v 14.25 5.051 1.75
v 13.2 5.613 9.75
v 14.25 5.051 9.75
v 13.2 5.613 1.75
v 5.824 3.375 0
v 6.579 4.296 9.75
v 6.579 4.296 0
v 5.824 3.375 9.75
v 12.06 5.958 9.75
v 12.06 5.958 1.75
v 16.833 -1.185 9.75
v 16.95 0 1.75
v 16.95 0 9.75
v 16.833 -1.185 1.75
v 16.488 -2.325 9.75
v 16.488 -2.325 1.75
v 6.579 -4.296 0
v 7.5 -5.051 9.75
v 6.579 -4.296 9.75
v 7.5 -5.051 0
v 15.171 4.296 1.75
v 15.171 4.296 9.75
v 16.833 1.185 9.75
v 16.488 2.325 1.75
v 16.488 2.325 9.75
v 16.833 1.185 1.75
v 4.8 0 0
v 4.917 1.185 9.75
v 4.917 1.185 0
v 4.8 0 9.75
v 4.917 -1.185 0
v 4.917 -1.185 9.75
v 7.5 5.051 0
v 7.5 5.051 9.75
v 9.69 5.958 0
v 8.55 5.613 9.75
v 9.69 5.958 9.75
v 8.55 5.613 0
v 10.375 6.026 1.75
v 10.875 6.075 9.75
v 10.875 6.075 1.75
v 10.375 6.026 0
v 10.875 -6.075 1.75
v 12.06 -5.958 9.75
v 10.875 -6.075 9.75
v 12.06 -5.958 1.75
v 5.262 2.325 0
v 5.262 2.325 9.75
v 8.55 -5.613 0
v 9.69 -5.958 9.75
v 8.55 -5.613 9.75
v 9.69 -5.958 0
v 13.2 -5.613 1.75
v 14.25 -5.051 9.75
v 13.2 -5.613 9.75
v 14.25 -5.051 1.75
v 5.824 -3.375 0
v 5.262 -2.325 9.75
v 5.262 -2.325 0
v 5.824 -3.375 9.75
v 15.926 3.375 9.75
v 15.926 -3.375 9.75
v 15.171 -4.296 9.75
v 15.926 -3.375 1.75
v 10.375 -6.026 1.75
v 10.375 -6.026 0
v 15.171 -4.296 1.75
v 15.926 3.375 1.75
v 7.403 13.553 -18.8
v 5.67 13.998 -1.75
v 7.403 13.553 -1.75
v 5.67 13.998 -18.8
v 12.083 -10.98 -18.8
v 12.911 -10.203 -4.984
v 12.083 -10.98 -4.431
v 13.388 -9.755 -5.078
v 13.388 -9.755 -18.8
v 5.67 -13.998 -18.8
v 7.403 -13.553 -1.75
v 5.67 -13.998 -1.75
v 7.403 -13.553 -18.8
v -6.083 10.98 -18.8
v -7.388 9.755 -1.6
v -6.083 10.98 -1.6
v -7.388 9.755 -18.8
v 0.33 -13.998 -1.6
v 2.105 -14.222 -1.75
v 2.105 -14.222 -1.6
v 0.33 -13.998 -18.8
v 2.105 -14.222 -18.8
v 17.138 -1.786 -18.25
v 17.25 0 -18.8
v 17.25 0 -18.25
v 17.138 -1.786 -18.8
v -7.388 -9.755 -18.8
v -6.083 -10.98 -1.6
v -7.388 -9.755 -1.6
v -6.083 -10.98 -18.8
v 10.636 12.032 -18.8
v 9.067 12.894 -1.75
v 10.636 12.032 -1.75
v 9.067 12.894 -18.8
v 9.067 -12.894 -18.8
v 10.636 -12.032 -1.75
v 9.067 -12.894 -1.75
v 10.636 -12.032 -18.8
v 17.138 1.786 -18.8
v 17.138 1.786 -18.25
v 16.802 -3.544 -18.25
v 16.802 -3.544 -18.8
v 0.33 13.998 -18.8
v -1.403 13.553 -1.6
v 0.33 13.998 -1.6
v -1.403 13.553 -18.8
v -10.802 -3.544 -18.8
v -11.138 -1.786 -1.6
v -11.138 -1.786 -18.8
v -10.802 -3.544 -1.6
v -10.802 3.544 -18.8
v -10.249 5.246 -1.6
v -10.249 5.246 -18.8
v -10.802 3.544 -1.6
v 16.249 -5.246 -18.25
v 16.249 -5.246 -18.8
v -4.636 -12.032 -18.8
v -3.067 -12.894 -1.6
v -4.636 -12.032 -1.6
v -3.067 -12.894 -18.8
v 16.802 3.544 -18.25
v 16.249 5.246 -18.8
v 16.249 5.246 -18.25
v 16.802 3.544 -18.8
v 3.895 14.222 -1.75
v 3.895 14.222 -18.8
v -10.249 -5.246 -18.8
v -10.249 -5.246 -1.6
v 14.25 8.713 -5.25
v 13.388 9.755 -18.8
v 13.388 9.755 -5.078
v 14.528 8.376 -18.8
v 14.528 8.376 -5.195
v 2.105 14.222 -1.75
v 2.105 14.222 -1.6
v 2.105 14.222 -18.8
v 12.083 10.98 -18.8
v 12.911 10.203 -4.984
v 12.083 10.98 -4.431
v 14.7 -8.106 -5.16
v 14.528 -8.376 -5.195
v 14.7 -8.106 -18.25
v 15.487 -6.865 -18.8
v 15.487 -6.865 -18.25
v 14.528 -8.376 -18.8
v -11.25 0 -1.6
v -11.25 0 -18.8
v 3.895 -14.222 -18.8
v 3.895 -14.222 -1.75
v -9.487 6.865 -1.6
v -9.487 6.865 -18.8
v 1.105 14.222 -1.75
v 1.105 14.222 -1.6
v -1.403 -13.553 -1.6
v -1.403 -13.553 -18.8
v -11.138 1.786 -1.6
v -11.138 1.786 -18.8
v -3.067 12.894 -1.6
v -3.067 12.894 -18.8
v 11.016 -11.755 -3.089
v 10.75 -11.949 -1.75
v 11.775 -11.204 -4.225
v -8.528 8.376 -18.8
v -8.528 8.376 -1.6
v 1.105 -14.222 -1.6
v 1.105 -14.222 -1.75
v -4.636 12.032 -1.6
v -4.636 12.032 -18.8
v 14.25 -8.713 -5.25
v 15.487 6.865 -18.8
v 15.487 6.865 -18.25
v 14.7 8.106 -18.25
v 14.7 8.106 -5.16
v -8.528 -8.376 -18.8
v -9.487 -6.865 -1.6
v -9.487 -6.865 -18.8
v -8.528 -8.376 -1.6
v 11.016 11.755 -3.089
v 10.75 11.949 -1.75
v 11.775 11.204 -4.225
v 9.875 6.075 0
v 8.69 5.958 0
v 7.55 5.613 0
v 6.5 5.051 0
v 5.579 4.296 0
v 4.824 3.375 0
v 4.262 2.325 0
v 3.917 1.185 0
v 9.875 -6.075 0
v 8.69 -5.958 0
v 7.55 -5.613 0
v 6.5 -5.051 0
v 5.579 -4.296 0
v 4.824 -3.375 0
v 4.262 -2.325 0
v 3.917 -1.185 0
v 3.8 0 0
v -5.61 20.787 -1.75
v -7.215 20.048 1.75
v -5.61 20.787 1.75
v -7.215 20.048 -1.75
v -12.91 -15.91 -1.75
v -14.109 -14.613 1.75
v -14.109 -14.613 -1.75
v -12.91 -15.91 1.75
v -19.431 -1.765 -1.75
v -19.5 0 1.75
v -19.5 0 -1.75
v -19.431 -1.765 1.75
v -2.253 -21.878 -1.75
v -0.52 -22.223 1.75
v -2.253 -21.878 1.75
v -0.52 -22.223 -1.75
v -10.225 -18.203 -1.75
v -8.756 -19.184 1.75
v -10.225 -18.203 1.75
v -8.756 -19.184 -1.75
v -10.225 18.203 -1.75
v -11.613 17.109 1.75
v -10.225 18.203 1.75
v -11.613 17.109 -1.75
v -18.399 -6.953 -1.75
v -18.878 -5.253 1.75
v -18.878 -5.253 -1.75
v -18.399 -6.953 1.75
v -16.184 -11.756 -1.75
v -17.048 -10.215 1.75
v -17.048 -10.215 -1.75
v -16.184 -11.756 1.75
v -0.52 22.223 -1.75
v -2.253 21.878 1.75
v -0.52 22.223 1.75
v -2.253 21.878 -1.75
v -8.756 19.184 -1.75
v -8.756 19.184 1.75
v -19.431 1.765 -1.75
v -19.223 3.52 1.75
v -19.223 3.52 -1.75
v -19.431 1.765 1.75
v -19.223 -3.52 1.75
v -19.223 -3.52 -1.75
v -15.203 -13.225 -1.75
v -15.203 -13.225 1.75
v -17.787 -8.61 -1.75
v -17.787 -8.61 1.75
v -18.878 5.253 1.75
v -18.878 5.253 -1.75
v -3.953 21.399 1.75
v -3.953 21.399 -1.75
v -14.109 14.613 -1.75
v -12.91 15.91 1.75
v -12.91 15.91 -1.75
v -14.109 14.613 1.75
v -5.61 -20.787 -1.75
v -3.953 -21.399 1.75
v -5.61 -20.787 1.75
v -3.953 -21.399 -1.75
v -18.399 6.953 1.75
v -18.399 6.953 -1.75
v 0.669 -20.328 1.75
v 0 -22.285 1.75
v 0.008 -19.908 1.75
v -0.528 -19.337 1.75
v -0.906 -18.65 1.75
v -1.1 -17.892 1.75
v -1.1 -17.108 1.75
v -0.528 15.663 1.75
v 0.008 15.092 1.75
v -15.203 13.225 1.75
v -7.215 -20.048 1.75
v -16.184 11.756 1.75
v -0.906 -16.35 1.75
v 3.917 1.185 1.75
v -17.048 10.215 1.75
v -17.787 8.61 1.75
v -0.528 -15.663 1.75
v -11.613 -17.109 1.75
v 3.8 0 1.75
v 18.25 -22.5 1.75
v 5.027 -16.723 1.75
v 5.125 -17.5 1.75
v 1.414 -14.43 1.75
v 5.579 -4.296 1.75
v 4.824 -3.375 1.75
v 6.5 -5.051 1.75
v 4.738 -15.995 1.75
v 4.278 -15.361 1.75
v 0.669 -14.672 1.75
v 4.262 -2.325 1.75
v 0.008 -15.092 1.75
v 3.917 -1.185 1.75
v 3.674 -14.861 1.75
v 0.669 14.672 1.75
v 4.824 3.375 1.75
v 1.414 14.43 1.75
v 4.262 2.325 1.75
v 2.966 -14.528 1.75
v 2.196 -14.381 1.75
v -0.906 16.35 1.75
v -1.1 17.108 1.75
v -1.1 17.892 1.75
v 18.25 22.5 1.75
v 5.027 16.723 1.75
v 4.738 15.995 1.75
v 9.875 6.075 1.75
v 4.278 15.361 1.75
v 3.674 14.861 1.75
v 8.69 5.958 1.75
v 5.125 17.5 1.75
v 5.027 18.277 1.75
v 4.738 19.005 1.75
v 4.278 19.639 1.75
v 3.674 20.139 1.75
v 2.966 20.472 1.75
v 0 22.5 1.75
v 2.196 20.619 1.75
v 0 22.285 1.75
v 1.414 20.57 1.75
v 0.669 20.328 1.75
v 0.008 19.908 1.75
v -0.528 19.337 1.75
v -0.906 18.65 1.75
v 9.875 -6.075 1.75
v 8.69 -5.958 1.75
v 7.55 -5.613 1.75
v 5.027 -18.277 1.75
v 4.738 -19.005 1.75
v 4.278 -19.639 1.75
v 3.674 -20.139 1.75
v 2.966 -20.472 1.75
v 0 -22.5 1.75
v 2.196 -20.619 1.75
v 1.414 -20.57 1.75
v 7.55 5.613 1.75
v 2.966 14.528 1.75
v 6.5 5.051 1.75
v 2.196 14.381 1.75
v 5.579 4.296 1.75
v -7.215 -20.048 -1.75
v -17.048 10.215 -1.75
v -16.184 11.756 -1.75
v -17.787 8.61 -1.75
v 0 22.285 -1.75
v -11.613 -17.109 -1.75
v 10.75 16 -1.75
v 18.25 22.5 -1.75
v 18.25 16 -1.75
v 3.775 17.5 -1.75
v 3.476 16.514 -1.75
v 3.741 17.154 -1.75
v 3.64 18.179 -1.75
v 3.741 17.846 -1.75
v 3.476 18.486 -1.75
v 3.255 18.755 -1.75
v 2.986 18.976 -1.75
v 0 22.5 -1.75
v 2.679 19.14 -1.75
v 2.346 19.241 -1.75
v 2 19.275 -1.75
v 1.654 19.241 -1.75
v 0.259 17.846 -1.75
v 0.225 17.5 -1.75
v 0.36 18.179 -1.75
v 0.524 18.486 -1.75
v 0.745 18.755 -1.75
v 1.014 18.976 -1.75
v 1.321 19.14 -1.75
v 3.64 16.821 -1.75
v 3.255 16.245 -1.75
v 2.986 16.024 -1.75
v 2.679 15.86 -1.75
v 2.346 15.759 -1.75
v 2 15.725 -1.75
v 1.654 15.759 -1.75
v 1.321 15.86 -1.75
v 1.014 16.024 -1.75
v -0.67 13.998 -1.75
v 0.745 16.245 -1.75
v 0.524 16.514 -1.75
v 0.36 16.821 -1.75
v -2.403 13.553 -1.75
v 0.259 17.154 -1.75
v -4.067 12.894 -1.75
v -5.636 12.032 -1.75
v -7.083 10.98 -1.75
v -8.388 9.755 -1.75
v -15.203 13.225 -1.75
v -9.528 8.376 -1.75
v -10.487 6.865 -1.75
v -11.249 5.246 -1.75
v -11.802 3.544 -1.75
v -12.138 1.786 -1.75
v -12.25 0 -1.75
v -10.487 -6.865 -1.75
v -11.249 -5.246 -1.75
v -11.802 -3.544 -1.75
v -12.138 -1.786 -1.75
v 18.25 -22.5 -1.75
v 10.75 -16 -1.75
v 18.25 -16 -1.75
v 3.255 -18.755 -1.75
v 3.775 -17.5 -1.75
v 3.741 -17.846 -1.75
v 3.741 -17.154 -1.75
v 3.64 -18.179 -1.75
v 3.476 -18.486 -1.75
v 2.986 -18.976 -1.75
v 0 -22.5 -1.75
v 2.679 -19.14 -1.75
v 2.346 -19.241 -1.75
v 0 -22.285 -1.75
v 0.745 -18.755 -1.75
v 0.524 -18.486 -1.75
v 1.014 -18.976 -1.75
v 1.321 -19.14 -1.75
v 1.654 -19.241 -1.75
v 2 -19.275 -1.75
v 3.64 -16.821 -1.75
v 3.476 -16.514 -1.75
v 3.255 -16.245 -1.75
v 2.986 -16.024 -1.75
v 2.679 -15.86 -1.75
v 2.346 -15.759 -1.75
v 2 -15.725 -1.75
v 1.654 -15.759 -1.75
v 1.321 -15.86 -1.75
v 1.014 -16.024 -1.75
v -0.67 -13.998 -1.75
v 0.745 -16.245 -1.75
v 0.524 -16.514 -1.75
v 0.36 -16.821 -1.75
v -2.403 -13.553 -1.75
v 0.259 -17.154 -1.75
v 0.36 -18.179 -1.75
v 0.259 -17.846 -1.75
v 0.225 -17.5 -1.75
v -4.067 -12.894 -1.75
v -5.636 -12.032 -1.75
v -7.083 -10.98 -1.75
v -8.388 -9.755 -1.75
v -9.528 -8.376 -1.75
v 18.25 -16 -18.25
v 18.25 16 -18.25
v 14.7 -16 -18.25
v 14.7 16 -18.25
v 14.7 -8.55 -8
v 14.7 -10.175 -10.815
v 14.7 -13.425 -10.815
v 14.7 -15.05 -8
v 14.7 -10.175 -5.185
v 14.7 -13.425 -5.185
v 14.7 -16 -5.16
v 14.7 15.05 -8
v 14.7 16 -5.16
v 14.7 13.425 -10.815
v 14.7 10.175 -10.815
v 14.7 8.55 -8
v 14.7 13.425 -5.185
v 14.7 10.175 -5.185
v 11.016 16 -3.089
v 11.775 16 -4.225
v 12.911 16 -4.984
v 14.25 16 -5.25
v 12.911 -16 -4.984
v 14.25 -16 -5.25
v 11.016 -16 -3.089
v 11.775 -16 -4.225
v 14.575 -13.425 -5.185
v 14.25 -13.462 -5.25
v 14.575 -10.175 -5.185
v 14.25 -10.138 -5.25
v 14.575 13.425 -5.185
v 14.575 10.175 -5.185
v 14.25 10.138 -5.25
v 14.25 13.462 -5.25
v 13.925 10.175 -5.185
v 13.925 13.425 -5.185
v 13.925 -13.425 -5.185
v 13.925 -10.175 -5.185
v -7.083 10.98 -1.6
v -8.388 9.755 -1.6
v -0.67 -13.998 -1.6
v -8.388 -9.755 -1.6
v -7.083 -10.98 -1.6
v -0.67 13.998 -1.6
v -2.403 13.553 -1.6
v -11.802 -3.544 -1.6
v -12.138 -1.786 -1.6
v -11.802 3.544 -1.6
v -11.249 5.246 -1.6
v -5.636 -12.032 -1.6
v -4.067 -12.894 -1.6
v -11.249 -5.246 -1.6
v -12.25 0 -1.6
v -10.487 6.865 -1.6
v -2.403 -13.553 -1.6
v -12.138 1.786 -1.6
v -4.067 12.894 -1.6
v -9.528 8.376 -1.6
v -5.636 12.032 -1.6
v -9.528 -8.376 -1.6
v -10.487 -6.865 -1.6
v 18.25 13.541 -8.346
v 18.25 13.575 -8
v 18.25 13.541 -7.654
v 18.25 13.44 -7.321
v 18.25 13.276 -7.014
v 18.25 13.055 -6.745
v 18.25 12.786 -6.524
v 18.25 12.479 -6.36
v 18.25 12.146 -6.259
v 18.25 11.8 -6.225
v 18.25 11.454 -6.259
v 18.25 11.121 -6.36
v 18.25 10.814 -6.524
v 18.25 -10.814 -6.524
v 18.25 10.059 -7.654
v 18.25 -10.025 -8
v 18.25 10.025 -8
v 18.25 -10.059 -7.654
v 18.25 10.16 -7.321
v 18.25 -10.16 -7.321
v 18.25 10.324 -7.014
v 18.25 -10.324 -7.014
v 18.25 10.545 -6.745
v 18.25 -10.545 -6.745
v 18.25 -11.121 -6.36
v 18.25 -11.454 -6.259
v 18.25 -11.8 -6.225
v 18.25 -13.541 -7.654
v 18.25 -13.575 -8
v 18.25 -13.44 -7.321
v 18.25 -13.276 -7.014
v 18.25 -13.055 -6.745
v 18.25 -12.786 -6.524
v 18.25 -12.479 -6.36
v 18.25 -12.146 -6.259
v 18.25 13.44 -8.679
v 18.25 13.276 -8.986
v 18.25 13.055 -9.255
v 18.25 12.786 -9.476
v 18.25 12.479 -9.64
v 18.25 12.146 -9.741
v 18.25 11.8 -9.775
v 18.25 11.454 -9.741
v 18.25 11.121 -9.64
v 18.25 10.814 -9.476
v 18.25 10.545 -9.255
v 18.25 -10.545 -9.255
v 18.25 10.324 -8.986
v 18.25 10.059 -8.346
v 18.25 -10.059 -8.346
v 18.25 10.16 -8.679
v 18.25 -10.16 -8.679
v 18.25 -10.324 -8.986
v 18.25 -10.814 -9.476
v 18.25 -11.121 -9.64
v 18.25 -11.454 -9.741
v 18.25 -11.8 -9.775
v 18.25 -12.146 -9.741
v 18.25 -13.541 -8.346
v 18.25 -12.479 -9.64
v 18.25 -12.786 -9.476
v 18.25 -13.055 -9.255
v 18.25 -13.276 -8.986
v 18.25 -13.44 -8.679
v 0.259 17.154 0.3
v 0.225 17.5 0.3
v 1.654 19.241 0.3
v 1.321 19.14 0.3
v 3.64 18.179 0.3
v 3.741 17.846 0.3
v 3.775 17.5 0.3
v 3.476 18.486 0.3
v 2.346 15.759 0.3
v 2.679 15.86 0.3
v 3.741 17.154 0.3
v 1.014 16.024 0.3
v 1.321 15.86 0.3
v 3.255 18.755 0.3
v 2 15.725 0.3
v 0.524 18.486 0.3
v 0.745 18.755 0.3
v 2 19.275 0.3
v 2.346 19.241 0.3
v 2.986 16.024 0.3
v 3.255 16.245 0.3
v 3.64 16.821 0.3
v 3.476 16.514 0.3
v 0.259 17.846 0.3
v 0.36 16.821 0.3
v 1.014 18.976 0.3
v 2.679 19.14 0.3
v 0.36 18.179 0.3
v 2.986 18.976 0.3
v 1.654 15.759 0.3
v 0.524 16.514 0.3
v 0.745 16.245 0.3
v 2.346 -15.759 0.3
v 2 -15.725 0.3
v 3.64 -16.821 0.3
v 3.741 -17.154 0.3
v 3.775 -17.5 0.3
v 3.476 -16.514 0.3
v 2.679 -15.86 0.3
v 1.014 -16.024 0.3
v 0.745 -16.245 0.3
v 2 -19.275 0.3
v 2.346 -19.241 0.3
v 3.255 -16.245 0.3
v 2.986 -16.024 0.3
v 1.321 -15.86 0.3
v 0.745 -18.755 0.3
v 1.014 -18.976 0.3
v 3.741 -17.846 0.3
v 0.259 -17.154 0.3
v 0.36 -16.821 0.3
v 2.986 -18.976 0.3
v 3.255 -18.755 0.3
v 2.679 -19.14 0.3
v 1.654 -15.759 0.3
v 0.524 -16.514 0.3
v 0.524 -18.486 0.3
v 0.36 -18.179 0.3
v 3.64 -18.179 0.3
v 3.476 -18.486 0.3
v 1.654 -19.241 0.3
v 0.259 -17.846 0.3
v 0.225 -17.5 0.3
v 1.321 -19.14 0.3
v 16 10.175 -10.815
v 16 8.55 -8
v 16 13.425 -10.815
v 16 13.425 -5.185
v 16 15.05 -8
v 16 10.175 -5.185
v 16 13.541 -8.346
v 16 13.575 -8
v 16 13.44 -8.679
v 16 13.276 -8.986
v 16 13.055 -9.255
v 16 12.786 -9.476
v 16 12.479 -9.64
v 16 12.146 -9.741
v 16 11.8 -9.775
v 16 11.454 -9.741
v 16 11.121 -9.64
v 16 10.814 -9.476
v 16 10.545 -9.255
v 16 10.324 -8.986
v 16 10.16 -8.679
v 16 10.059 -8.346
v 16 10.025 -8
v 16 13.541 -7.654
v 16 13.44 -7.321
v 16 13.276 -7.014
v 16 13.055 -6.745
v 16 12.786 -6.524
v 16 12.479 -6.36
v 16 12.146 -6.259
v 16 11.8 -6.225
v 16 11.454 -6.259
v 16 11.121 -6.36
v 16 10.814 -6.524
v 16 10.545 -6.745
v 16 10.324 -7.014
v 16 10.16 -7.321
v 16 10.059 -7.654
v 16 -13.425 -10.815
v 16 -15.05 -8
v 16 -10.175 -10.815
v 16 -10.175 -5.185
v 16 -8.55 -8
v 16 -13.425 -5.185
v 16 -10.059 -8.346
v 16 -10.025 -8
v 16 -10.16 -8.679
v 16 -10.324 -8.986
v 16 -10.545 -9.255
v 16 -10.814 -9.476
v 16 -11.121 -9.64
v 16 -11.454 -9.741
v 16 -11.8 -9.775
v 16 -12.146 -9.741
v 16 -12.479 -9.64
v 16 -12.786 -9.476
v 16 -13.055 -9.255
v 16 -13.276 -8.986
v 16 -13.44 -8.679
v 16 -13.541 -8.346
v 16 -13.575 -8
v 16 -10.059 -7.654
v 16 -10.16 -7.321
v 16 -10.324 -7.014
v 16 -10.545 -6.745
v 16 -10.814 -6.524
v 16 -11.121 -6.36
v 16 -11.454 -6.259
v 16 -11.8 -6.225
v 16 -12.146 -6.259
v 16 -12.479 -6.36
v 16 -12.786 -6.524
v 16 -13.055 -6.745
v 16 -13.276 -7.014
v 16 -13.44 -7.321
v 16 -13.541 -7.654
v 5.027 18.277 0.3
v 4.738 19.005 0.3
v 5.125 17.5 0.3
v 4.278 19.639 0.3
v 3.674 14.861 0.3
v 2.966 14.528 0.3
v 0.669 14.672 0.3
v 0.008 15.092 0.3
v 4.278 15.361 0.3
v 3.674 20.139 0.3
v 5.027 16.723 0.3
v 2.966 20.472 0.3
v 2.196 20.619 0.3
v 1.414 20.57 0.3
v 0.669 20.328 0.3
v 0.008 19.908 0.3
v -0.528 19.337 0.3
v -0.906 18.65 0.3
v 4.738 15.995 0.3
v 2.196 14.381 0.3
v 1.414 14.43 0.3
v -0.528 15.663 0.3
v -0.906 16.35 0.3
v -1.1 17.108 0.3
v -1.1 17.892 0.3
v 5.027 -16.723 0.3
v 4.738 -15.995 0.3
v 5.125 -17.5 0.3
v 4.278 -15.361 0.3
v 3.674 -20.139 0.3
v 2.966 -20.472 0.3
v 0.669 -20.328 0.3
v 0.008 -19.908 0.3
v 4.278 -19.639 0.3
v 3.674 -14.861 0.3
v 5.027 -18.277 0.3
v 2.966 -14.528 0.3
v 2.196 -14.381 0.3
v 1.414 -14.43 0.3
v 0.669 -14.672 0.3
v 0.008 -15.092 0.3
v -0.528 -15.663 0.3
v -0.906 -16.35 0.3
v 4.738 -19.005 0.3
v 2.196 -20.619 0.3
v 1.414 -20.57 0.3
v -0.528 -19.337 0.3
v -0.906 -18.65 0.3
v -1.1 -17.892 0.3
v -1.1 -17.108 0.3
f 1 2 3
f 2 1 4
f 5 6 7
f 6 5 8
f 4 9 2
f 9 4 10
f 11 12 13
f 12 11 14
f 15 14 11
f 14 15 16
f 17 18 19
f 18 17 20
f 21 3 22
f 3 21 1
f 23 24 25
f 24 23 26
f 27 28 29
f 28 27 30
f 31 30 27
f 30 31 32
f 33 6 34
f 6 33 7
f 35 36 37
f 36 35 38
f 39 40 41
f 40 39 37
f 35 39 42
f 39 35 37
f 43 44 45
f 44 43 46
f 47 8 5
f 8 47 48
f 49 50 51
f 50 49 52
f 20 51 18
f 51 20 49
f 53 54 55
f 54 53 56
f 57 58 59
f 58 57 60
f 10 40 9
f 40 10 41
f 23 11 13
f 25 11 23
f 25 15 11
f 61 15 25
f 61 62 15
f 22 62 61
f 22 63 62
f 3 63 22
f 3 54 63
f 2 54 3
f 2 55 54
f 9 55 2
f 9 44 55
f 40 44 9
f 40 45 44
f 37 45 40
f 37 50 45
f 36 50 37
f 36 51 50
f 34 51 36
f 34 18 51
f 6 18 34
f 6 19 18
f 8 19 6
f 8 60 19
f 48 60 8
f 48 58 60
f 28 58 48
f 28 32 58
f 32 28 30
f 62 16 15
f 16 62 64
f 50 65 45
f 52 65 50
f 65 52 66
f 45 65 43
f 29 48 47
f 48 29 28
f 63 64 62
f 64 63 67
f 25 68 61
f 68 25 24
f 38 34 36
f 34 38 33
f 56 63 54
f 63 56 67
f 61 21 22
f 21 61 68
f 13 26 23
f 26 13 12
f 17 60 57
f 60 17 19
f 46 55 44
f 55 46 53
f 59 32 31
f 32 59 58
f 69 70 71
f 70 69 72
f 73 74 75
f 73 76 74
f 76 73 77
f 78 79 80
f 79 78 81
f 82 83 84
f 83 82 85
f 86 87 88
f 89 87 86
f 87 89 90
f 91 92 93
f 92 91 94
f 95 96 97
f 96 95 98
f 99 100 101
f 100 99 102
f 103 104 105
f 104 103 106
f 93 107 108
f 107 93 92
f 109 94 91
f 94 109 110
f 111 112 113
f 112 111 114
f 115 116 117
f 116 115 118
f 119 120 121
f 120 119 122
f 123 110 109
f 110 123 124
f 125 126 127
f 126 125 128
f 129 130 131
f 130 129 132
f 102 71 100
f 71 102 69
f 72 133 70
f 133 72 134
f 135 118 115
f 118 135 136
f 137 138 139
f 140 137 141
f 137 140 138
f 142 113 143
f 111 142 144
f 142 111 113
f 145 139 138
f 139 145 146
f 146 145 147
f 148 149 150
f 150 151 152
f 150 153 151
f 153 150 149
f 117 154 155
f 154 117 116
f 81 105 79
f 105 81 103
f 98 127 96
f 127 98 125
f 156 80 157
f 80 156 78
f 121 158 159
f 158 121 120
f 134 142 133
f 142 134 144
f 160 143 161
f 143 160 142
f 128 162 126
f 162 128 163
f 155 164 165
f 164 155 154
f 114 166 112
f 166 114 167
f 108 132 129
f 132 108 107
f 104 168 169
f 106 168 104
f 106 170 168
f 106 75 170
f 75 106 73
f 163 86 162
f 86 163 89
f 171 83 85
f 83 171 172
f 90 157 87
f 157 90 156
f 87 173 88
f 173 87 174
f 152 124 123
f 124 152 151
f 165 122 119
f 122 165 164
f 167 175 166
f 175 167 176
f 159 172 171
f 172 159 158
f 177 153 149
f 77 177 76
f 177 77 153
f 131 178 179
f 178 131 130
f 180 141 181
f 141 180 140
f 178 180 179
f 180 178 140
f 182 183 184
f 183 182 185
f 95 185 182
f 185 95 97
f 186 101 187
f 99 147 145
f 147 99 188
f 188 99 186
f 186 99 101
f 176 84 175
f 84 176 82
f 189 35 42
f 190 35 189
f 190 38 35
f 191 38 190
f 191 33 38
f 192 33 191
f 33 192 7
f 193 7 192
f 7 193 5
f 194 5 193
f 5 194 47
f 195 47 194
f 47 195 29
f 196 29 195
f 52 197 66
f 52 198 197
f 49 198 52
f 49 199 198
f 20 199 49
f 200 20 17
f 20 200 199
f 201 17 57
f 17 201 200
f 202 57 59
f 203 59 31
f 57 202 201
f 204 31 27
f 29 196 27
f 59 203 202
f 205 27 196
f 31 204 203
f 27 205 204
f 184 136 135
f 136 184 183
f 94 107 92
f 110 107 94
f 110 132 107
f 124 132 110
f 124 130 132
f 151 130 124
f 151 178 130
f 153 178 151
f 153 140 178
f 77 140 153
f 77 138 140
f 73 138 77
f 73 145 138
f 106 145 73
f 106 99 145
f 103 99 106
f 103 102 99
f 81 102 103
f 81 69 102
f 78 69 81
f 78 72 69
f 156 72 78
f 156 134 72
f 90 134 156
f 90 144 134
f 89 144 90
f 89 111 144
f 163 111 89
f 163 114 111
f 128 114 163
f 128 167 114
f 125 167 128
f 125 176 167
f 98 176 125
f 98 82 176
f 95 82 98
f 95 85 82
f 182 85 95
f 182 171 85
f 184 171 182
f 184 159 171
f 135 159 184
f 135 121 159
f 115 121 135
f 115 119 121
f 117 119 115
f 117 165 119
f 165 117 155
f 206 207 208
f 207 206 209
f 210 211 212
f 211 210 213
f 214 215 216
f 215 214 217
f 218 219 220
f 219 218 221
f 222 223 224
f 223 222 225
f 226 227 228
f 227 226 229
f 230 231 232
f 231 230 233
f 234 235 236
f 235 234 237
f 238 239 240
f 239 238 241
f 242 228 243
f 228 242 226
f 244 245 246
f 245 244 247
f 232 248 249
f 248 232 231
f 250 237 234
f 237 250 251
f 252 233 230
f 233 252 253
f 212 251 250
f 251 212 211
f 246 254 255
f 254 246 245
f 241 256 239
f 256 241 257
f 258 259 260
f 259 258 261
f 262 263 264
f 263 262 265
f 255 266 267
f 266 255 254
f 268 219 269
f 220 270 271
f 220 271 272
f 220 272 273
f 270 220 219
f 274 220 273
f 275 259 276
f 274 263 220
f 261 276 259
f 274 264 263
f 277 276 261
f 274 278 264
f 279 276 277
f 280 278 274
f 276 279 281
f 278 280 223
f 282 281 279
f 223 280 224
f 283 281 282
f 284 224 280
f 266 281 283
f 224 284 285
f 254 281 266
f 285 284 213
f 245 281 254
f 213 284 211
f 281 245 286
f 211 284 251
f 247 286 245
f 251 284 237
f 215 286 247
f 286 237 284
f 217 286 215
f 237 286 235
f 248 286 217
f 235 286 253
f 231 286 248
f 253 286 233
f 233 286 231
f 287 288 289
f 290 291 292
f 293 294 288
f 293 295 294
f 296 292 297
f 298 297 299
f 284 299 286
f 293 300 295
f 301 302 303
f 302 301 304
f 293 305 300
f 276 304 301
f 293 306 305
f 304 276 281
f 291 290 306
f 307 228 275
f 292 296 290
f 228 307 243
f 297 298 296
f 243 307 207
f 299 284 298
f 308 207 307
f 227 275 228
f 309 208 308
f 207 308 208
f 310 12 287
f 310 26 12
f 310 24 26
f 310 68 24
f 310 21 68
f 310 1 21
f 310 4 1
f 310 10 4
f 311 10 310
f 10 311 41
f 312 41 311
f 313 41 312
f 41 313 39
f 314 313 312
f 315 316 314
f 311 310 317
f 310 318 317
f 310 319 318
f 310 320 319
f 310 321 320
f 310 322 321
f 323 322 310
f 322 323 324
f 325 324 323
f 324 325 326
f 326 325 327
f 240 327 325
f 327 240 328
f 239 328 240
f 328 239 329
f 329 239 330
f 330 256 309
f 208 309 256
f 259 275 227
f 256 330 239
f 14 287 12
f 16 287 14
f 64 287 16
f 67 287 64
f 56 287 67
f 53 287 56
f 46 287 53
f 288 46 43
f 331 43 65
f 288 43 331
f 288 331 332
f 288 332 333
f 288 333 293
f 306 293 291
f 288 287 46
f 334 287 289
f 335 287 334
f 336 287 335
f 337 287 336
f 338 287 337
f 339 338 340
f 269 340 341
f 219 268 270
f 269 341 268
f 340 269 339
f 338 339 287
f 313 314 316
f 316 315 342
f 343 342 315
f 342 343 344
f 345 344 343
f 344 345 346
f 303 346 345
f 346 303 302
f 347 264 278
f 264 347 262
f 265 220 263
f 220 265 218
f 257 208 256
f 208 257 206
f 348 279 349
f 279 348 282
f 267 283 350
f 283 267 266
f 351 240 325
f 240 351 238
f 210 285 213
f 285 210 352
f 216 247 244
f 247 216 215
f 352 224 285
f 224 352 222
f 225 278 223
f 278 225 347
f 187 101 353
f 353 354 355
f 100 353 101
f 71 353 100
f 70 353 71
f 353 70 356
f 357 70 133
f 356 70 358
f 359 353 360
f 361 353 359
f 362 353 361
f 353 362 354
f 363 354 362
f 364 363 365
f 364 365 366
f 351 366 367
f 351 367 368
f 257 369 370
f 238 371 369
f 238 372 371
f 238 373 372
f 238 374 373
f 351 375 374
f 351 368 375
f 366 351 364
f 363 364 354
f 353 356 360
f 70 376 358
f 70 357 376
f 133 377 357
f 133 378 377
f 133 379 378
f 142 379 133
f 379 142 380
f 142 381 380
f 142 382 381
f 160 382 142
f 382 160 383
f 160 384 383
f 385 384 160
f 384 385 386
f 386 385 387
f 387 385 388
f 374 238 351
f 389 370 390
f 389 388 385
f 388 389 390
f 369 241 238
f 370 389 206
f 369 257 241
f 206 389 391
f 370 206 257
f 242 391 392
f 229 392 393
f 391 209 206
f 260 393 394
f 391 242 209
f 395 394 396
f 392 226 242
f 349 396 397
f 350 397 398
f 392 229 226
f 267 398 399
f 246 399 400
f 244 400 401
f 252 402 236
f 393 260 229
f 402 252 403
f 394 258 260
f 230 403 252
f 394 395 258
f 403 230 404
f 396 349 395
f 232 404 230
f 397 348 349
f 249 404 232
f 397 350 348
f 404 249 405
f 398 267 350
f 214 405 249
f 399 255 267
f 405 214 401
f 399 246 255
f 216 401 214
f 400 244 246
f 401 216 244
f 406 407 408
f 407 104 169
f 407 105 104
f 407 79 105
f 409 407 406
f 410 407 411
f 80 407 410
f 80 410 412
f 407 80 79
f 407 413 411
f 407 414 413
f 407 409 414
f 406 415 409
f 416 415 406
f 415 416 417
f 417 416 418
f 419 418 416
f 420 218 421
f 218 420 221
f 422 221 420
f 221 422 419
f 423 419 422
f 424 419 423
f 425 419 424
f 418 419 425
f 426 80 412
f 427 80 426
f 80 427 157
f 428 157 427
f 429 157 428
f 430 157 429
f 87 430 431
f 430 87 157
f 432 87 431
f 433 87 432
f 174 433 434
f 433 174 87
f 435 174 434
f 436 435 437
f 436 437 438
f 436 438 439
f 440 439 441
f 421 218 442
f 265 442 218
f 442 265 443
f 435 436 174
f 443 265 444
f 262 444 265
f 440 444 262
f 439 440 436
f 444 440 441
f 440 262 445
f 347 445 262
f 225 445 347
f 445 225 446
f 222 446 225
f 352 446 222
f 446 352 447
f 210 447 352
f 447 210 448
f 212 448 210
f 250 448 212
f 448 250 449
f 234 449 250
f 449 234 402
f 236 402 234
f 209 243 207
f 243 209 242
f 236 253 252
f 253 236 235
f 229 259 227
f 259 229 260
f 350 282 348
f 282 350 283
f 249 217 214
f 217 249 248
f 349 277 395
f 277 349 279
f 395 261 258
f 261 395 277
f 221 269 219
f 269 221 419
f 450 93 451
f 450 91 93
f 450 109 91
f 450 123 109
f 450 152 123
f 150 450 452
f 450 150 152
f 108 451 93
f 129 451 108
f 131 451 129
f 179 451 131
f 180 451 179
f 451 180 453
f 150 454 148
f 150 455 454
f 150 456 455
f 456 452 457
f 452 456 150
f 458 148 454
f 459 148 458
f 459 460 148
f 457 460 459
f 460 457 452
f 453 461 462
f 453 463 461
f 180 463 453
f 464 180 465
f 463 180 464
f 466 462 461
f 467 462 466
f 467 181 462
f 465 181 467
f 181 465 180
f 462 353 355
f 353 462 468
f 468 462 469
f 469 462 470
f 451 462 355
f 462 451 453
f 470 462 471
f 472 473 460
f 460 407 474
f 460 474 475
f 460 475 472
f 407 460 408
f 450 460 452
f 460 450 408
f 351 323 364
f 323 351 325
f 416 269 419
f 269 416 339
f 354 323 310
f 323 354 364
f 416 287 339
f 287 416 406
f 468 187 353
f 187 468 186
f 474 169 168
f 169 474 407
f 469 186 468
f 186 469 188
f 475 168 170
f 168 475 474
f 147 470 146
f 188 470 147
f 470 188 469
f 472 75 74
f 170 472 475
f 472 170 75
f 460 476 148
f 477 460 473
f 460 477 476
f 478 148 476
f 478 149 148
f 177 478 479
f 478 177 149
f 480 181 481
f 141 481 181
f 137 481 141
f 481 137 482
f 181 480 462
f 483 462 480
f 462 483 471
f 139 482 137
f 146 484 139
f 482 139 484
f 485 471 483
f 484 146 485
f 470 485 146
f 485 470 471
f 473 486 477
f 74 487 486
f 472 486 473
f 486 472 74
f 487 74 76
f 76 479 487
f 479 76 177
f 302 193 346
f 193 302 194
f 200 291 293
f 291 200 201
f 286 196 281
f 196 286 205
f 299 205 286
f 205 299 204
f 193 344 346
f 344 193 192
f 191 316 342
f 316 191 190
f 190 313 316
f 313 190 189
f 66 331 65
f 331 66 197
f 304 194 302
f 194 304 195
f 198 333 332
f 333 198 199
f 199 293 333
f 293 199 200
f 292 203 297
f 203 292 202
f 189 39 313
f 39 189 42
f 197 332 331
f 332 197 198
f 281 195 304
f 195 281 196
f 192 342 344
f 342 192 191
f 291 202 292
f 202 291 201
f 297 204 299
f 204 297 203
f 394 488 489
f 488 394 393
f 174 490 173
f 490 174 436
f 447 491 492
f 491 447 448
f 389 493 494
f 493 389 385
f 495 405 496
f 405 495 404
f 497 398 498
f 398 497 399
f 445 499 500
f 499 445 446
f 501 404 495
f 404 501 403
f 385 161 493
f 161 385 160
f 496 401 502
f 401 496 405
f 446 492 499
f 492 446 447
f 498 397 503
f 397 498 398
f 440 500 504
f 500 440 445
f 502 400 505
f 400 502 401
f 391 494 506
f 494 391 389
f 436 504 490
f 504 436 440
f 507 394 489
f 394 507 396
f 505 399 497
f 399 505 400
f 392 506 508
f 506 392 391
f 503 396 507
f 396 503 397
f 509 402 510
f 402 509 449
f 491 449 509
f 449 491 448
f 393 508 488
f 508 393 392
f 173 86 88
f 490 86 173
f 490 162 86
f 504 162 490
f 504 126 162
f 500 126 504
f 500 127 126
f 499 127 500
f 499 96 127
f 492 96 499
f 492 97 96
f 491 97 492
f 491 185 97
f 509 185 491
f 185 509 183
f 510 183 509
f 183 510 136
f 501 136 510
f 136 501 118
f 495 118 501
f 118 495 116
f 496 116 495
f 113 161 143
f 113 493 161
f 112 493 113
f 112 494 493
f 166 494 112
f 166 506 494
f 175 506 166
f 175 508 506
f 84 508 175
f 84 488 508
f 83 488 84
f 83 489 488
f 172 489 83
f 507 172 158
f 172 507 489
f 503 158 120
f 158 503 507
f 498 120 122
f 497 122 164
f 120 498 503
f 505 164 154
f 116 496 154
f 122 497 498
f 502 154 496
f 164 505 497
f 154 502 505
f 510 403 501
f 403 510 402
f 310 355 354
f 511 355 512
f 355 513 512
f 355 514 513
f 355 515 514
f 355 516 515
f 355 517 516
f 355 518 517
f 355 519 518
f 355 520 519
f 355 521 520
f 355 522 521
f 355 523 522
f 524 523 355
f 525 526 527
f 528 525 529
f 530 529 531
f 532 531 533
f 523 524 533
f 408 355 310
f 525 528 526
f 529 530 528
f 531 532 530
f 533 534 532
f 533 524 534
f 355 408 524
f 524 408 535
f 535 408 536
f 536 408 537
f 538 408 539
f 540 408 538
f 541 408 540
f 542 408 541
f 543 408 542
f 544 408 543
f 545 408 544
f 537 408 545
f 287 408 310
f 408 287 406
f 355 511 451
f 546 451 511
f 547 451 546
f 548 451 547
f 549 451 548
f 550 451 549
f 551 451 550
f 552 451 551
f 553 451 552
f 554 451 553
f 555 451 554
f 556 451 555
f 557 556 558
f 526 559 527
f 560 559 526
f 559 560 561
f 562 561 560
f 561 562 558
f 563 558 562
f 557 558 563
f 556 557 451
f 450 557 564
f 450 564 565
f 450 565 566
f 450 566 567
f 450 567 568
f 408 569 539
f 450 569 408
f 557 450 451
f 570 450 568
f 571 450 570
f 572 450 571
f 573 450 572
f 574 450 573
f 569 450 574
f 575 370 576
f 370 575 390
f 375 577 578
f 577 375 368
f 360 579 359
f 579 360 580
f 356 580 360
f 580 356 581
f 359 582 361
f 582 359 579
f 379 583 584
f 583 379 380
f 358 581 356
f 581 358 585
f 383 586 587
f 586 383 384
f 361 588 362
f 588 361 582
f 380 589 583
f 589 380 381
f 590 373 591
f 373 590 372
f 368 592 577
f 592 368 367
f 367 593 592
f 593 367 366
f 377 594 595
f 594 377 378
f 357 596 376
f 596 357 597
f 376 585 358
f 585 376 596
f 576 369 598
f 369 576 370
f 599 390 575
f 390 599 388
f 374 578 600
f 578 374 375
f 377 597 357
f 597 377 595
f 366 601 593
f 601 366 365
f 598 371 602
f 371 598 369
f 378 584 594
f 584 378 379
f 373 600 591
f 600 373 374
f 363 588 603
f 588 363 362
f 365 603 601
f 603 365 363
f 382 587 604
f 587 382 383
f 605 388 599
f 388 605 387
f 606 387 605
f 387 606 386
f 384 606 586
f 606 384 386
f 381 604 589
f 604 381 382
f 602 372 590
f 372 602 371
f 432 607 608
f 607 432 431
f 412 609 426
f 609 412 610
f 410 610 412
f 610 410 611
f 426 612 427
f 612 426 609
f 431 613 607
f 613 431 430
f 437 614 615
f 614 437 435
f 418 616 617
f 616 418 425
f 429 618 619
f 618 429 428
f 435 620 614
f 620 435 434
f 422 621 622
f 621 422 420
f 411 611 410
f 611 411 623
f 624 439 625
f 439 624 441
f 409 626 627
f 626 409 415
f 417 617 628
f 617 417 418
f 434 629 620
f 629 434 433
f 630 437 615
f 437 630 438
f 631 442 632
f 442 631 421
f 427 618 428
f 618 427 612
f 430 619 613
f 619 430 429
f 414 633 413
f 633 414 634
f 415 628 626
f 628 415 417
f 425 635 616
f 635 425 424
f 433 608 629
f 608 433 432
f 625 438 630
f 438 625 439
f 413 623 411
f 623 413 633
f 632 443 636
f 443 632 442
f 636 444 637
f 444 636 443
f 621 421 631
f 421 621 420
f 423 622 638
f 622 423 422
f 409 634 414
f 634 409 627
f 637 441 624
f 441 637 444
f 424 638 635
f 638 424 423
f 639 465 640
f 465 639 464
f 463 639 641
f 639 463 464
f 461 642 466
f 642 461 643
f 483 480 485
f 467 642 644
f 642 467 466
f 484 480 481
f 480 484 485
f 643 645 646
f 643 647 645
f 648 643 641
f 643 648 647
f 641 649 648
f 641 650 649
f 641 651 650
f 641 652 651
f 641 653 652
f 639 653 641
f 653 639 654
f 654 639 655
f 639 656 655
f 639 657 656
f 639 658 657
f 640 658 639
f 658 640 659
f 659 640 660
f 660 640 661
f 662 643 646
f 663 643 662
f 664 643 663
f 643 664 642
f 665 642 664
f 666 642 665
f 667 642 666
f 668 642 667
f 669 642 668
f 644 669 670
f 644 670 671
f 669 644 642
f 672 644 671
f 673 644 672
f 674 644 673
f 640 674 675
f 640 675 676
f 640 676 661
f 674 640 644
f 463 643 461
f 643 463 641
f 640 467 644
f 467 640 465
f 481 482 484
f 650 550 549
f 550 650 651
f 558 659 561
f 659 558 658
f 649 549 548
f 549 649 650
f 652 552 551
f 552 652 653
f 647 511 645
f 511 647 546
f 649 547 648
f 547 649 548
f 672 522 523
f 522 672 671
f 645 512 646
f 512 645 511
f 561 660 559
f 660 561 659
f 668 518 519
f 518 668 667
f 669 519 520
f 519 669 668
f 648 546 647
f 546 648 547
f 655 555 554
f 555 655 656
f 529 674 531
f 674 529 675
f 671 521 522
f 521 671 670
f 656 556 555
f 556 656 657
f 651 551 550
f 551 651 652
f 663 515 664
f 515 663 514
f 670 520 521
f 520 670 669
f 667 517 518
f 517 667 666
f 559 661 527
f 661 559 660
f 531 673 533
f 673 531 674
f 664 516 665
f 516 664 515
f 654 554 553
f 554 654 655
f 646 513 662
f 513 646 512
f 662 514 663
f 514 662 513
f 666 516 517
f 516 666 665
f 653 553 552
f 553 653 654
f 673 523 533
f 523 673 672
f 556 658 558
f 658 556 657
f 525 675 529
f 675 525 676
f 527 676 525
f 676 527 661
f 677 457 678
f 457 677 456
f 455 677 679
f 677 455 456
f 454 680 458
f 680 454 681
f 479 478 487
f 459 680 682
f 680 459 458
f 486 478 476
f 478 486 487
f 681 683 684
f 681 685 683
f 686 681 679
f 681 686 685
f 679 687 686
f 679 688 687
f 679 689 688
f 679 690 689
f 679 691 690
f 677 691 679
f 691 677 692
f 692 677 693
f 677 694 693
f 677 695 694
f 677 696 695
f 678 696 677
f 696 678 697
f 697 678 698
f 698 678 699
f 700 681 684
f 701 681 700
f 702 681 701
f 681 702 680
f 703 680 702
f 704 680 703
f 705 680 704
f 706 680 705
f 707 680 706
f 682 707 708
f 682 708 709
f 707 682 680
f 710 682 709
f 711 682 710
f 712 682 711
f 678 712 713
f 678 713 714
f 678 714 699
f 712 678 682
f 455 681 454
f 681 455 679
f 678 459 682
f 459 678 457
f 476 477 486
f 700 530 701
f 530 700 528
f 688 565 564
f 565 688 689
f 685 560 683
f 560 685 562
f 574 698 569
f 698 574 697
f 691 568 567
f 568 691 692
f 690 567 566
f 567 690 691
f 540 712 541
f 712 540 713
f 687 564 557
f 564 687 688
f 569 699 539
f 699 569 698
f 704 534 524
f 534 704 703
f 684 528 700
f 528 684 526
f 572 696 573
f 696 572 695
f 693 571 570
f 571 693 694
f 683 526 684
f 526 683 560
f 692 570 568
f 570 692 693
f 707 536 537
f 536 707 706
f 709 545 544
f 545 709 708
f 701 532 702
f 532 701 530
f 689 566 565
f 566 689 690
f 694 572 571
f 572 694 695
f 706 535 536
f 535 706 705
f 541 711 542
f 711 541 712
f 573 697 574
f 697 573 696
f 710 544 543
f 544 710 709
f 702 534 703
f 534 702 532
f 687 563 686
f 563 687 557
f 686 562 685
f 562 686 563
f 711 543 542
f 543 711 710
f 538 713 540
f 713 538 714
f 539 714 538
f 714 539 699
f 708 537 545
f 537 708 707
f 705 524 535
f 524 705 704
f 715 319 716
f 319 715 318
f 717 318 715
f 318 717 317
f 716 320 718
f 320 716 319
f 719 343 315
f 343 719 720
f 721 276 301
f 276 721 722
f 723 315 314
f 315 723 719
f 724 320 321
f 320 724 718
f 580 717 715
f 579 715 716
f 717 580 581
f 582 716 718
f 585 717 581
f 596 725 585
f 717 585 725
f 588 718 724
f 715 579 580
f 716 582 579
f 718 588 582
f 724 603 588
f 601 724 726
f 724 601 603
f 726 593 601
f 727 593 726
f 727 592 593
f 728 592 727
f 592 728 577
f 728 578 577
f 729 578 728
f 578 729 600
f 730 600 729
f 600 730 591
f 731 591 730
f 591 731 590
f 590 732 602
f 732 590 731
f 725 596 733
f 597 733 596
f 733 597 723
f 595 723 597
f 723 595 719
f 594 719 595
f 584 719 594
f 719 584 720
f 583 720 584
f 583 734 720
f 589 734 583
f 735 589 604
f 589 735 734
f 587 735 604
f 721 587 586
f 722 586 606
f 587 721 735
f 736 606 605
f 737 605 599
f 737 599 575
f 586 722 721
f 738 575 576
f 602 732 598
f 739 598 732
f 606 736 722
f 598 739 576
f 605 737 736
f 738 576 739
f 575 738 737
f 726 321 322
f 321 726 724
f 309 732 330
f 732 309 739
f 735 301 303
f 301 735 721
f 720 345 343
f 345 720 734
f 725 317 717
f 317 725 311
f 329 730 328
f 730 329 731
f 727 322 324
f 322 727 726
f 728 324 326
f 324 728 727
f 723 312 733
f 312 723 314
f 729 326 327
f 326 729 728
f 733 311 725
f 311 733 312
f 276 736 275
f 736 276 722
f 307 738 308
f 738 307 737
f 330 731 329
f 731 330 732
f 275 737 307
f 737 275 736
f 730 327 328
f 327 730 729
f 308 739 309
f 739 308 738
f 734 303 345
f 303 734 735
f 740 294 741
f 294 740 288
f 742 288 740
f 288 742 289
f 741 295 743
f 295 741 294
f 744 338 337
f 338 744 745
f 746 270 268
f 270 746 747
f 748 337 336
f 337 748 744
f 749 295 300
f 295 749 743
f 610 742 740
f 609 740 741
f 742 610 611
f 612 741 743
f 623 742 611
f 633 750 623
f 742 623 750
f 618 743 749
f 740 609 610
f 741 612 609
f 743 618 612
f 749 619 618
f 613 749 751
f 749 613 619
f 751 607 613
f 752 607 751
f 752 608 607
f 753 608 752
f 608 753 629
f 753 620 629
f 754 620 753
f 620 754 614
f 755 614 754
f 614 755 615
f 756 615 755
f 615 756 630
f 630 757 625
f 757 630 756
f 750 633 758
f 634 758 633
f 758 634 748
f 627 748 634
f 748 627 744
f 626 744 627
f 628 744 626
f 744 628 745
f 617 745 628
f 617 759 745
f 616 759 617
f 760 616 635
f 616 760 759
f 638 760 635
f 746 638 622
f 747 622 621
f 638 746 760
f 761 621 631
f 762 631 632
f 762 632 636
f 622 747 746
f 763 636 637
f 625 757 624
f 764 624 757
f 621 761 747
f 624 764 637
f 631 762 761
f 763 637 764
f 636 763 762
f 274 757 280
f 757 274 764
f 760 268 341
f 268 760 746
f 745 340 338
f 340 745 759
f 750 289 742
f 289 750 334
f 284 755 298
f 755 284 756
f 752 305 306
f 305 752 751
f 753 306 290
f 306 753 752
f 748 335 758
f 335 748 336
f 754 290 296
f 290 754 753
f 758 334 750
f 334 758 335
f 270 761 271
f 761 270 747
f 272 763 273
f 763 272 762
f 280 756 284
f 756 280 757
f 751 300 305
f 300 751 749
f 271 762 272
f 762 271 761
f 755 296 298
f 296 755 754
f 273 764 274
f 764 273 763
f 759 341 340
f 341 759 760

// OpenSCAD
// Original :http://www.thingiverse.com/thing:423357
// Bracket for  28BYJ-48 stepper motor
// 28BYJ-48 model from RGriffoGoes www.thingiverse.com/thing:204734
// added details by J.Beale 21 July 2014
// Bracket by J.Beale 9 Aug 2014

slop = 0.25;  // printer tolerance

// =========================================================
// stepper motor body model

MBH = 18.8;   // motor body height
MBD = 28.25+slop;  // motor body OD
SBD = 9.1+slop;    // shaft boss OD
SBH = 1.45;   // shaft boss height above motor body
SBO = 7.875;  // offset of shaft/boss center from motor center
//SHD = 4.93+slop*2;   // motor shaft OD+ countersink for boss
SHD = 11.9+slop;   // motor shaft OD (larger clearance hole)
SHDF = 3.0;   // motor shaft diameter, across flats
SHHF = 6.0;   // motor shaft flats height, or depth in from end
SHHF = 0.0;   // assume round shaft for purposes of bracket
SHH = 9.75;   // height of shaft above motor body 

MBFH = 0.7;   // height of body edge flange protruding above surface
MBFW = 1.0+slop;   // width of edge flange
MBFNW = 8;    // width of notch in edge flange
MBFNW2 = 17.8;  // width of edge flange notch above wiring box

MHCC = 35.0;  // mounting hole center-to-center was 35
MTH  = 0.8;   // mounting tab thickness
MTW  = 0.0;   // mounting tab width
// MTHID = 4.0;  // mounting tab hole inner diameter
MTHID = 3.0;  // mounting tab hole inner diameter
WBH  = 16.7;  // plastic wiring box height
WBW  = 14.6+slop;  // plastic wiring box width
WBD  = 31.3+slop;  // body diameter to outer surface of wiring box

WRD = 1.0;     // diameter of electrical wires
WRL = 30;      // length of electrical wires
WRO = 2.2;		// offset of wires below top motor surface
// =========================================================
// right-angle bracket for motor

MSOD = 6.0 + slop;  // M3 mounting screw head diameter // WAS 5.9
MSTH = 1.5;  // M3 screw head thickness (for countersink)
//MSTH = 0; // set to zero for no screwhead countersink
MSSD = 3.3 + slop;  // M3 screw diameter clearance hole // WAS 3.1
Bthick = 3.5;  // thickness of bracket
Bdia = (MHCC+10);  // diameter of bracket face
M3nutDia = 6.5;

// =========================================================
fn = 80;
eps = 0.05;   // small number to avoid coincident faces

motorOffset = 3;


module StepMotor28BYJ()
{
  difference(){
    union(){
	   color("gray") translate([0,0,-(MBH+MBFH)/2])
	  difference() {  // flange at top rim
        // cylinder(h = MBFH+eps, r = MBD/2, center = true, $fn = 50);
         //cylinder(h = MBFH+2*eps, r = (MBD-MBFW)/2, center = true, $fn = 32);
			//cube([MBFNW,MHCC,MBFH*2],center=true); // notches in rim
			//cube([MBD+2*MBFW,SBD,MBFH*2],center=true);
		   //translate([-MBD/2,0,0]) cube([MBD,MBFNW2,MBFH*2],center=true);
        }
		color("gray") // motor body
			cylinder(h = MBH, r = MBD/2, center = true, $fn = 50);
		color("gray") translate([SBO,0,-SBH])	// shaft boss
			cylinder(h = MBH, r = SBD/2, center = true, $fn = 32);

		translate([SBO,0,-SHH])	// motor shaft
        difference() {
			color("gold") cylinder(h = MBH, r = SHD/2, center = true, $fn = 32);
				// shaft flats
		   color("red") translate([(SHD+SHDF)/2,0,-(eps+MBH-SHHF)/2]) 
				cube([SHD,SHD,SHHF], center = true);
		   color("red") translate([-(SHD+SHDF)/2,0,-(eps+MBH-SHHF)/2]) 
				cube([SHD,SHD,SHHF], center = true);
        }


		//color("Silver") translate([0,0,-(MBH-MTH-eps)/2]) // mounting tab 
		//	cube([MTW,MHCC,MTH], center = true);				
		//color("Silver") translate([0,MHCC/2,-(MBH-MTH)/2]) // mt.tab rounded end
		//	cylinder(h = MTH, r = MTW/2, center = true, $fn = 32);
		//color("Silver") translate([0,-MHCC/2,-(MBH-MTH)/2]) // mt.tab rounded end
		//	cylinder(h = MTH, r = MTW/2, center = true, $fn = 32);


		//color("blue") translate([-(WBD-MBD),0,eps-(MBH-WBH)/2]) // plastic wire box
		//	cube([MBD,WBW,WBH], center = true);
	    //color("blue") translate([-2,0,0])	
		//	cube([24.5,16,15], center = true);
		}

				// mounting holes in tabs on side
		color("red") translate([0,MHCC/2,-MBH/2])	
				cylinder(h = 2, r = MTHID/2, center = true, $fn = 32);
		color("red") translate([0,-MHCC/2,-MBH/2])	
				cylinder(h = 2, r = MTHID/2, center = true, $fn = 32);
		}
}



module MOT() {
 translate([motorOffset,0,-MBH/2 ]) 
 rotate([180,0,0]) StepMotor28BYJ();  // motor body (without wires)
}


module bracket() {
difference() {
 union() {
  translate([motorOffset,0,-Bthick/2]) cylinder(h=Bthick, r=Bdia/2, $fn=fn);  // round face
     
  echo(Bdia);
  translate([-eps + MBD/2 + 0.5,-32/2,-20+Bthick/2]) 
  		cube([5.5+eps,32,20]); // flange
     
     
  translate([-0,-Bdia/2,-Bthick/2]) 
	cube([Bdia,Bdia,Bthick]); // square edge joining round face to flange
  translate([MBD/2,32/2,-Bthick/2]) rotate([90,0,0]) 
  	cylinder(r=Bthick,h=32,$fn=16); // round fillet at flange
 }
 
 union() {
   translate([4+MBD/2,-MBD,-MBD]) cube([MBD*2,MBD*2,MBD*2]);
   translate([motorOffset - 1,MHCC/2,-10])	// motor mounting bolt
   			cylinder(h = 30, r = MSSD/2, center = true, $fn = 32);
   translate([motorOffset - 1,-MHCC/2,-10])	// motor mounting bole
				cylinder(h = 30, r = MSSD/2, center = true, $fn = 32);



   translate([1.0,11.8,-8]) rotate([0,90,0]) 	// flange mounting bolt
     rotate([0, 0, 30])
				cylinder(h = 30, d = M3nutDia, center = true, $fn = 6);   
   translate([10,11.8,-8]) rotate([0,90,0]) 	// flange mounting bolt
				//cylinder(h = 30, r = MSOD/2, center = true, $fn = 6);                
				cylinder(h = 30, r = MSSD/2, center = true, $fn = 32);
     
   translate([1.0,-11.8,-8]) rotate([0,90,0]) 	// flange mounting bolt
     rotate([0, 0, 30])     
				cylinder(h = 30, d = M3nutDia, center = true, $fn = 6);        
   translate([10,-11.8,-8]) rotate([0,90,0]) 	// flange mounting bolt
				cylinder(h = 30, r = MSSD/2, center = true, $fn = 32);

   color("white") translate([motorOffset - 1, MHCC/2,((Bthick/2) - MSTH + eps)]) 
	 cylinder(r=MSOD/2, h=MSTH, $fn=25); // motor screw countersink
   color("white") translate([motorOffset - 1,-MHCC/2,((Bthick/2) - MSTH + eps)])  
	 cylinder(r=MSOD/2, h=MSTH, $fn=25); // motor screw countersink

   translate([-1,0,-1.6]) MOT(); // body of motor
   //translate([0,0,-10]) cube([50,50,50]); // DEBUG cutaway view
 }
}
} // end module()

rotate([0,0,0]) bracket();  // show the motor bracket
MOT();
//bracket();
//StepMotor28BYJ();
